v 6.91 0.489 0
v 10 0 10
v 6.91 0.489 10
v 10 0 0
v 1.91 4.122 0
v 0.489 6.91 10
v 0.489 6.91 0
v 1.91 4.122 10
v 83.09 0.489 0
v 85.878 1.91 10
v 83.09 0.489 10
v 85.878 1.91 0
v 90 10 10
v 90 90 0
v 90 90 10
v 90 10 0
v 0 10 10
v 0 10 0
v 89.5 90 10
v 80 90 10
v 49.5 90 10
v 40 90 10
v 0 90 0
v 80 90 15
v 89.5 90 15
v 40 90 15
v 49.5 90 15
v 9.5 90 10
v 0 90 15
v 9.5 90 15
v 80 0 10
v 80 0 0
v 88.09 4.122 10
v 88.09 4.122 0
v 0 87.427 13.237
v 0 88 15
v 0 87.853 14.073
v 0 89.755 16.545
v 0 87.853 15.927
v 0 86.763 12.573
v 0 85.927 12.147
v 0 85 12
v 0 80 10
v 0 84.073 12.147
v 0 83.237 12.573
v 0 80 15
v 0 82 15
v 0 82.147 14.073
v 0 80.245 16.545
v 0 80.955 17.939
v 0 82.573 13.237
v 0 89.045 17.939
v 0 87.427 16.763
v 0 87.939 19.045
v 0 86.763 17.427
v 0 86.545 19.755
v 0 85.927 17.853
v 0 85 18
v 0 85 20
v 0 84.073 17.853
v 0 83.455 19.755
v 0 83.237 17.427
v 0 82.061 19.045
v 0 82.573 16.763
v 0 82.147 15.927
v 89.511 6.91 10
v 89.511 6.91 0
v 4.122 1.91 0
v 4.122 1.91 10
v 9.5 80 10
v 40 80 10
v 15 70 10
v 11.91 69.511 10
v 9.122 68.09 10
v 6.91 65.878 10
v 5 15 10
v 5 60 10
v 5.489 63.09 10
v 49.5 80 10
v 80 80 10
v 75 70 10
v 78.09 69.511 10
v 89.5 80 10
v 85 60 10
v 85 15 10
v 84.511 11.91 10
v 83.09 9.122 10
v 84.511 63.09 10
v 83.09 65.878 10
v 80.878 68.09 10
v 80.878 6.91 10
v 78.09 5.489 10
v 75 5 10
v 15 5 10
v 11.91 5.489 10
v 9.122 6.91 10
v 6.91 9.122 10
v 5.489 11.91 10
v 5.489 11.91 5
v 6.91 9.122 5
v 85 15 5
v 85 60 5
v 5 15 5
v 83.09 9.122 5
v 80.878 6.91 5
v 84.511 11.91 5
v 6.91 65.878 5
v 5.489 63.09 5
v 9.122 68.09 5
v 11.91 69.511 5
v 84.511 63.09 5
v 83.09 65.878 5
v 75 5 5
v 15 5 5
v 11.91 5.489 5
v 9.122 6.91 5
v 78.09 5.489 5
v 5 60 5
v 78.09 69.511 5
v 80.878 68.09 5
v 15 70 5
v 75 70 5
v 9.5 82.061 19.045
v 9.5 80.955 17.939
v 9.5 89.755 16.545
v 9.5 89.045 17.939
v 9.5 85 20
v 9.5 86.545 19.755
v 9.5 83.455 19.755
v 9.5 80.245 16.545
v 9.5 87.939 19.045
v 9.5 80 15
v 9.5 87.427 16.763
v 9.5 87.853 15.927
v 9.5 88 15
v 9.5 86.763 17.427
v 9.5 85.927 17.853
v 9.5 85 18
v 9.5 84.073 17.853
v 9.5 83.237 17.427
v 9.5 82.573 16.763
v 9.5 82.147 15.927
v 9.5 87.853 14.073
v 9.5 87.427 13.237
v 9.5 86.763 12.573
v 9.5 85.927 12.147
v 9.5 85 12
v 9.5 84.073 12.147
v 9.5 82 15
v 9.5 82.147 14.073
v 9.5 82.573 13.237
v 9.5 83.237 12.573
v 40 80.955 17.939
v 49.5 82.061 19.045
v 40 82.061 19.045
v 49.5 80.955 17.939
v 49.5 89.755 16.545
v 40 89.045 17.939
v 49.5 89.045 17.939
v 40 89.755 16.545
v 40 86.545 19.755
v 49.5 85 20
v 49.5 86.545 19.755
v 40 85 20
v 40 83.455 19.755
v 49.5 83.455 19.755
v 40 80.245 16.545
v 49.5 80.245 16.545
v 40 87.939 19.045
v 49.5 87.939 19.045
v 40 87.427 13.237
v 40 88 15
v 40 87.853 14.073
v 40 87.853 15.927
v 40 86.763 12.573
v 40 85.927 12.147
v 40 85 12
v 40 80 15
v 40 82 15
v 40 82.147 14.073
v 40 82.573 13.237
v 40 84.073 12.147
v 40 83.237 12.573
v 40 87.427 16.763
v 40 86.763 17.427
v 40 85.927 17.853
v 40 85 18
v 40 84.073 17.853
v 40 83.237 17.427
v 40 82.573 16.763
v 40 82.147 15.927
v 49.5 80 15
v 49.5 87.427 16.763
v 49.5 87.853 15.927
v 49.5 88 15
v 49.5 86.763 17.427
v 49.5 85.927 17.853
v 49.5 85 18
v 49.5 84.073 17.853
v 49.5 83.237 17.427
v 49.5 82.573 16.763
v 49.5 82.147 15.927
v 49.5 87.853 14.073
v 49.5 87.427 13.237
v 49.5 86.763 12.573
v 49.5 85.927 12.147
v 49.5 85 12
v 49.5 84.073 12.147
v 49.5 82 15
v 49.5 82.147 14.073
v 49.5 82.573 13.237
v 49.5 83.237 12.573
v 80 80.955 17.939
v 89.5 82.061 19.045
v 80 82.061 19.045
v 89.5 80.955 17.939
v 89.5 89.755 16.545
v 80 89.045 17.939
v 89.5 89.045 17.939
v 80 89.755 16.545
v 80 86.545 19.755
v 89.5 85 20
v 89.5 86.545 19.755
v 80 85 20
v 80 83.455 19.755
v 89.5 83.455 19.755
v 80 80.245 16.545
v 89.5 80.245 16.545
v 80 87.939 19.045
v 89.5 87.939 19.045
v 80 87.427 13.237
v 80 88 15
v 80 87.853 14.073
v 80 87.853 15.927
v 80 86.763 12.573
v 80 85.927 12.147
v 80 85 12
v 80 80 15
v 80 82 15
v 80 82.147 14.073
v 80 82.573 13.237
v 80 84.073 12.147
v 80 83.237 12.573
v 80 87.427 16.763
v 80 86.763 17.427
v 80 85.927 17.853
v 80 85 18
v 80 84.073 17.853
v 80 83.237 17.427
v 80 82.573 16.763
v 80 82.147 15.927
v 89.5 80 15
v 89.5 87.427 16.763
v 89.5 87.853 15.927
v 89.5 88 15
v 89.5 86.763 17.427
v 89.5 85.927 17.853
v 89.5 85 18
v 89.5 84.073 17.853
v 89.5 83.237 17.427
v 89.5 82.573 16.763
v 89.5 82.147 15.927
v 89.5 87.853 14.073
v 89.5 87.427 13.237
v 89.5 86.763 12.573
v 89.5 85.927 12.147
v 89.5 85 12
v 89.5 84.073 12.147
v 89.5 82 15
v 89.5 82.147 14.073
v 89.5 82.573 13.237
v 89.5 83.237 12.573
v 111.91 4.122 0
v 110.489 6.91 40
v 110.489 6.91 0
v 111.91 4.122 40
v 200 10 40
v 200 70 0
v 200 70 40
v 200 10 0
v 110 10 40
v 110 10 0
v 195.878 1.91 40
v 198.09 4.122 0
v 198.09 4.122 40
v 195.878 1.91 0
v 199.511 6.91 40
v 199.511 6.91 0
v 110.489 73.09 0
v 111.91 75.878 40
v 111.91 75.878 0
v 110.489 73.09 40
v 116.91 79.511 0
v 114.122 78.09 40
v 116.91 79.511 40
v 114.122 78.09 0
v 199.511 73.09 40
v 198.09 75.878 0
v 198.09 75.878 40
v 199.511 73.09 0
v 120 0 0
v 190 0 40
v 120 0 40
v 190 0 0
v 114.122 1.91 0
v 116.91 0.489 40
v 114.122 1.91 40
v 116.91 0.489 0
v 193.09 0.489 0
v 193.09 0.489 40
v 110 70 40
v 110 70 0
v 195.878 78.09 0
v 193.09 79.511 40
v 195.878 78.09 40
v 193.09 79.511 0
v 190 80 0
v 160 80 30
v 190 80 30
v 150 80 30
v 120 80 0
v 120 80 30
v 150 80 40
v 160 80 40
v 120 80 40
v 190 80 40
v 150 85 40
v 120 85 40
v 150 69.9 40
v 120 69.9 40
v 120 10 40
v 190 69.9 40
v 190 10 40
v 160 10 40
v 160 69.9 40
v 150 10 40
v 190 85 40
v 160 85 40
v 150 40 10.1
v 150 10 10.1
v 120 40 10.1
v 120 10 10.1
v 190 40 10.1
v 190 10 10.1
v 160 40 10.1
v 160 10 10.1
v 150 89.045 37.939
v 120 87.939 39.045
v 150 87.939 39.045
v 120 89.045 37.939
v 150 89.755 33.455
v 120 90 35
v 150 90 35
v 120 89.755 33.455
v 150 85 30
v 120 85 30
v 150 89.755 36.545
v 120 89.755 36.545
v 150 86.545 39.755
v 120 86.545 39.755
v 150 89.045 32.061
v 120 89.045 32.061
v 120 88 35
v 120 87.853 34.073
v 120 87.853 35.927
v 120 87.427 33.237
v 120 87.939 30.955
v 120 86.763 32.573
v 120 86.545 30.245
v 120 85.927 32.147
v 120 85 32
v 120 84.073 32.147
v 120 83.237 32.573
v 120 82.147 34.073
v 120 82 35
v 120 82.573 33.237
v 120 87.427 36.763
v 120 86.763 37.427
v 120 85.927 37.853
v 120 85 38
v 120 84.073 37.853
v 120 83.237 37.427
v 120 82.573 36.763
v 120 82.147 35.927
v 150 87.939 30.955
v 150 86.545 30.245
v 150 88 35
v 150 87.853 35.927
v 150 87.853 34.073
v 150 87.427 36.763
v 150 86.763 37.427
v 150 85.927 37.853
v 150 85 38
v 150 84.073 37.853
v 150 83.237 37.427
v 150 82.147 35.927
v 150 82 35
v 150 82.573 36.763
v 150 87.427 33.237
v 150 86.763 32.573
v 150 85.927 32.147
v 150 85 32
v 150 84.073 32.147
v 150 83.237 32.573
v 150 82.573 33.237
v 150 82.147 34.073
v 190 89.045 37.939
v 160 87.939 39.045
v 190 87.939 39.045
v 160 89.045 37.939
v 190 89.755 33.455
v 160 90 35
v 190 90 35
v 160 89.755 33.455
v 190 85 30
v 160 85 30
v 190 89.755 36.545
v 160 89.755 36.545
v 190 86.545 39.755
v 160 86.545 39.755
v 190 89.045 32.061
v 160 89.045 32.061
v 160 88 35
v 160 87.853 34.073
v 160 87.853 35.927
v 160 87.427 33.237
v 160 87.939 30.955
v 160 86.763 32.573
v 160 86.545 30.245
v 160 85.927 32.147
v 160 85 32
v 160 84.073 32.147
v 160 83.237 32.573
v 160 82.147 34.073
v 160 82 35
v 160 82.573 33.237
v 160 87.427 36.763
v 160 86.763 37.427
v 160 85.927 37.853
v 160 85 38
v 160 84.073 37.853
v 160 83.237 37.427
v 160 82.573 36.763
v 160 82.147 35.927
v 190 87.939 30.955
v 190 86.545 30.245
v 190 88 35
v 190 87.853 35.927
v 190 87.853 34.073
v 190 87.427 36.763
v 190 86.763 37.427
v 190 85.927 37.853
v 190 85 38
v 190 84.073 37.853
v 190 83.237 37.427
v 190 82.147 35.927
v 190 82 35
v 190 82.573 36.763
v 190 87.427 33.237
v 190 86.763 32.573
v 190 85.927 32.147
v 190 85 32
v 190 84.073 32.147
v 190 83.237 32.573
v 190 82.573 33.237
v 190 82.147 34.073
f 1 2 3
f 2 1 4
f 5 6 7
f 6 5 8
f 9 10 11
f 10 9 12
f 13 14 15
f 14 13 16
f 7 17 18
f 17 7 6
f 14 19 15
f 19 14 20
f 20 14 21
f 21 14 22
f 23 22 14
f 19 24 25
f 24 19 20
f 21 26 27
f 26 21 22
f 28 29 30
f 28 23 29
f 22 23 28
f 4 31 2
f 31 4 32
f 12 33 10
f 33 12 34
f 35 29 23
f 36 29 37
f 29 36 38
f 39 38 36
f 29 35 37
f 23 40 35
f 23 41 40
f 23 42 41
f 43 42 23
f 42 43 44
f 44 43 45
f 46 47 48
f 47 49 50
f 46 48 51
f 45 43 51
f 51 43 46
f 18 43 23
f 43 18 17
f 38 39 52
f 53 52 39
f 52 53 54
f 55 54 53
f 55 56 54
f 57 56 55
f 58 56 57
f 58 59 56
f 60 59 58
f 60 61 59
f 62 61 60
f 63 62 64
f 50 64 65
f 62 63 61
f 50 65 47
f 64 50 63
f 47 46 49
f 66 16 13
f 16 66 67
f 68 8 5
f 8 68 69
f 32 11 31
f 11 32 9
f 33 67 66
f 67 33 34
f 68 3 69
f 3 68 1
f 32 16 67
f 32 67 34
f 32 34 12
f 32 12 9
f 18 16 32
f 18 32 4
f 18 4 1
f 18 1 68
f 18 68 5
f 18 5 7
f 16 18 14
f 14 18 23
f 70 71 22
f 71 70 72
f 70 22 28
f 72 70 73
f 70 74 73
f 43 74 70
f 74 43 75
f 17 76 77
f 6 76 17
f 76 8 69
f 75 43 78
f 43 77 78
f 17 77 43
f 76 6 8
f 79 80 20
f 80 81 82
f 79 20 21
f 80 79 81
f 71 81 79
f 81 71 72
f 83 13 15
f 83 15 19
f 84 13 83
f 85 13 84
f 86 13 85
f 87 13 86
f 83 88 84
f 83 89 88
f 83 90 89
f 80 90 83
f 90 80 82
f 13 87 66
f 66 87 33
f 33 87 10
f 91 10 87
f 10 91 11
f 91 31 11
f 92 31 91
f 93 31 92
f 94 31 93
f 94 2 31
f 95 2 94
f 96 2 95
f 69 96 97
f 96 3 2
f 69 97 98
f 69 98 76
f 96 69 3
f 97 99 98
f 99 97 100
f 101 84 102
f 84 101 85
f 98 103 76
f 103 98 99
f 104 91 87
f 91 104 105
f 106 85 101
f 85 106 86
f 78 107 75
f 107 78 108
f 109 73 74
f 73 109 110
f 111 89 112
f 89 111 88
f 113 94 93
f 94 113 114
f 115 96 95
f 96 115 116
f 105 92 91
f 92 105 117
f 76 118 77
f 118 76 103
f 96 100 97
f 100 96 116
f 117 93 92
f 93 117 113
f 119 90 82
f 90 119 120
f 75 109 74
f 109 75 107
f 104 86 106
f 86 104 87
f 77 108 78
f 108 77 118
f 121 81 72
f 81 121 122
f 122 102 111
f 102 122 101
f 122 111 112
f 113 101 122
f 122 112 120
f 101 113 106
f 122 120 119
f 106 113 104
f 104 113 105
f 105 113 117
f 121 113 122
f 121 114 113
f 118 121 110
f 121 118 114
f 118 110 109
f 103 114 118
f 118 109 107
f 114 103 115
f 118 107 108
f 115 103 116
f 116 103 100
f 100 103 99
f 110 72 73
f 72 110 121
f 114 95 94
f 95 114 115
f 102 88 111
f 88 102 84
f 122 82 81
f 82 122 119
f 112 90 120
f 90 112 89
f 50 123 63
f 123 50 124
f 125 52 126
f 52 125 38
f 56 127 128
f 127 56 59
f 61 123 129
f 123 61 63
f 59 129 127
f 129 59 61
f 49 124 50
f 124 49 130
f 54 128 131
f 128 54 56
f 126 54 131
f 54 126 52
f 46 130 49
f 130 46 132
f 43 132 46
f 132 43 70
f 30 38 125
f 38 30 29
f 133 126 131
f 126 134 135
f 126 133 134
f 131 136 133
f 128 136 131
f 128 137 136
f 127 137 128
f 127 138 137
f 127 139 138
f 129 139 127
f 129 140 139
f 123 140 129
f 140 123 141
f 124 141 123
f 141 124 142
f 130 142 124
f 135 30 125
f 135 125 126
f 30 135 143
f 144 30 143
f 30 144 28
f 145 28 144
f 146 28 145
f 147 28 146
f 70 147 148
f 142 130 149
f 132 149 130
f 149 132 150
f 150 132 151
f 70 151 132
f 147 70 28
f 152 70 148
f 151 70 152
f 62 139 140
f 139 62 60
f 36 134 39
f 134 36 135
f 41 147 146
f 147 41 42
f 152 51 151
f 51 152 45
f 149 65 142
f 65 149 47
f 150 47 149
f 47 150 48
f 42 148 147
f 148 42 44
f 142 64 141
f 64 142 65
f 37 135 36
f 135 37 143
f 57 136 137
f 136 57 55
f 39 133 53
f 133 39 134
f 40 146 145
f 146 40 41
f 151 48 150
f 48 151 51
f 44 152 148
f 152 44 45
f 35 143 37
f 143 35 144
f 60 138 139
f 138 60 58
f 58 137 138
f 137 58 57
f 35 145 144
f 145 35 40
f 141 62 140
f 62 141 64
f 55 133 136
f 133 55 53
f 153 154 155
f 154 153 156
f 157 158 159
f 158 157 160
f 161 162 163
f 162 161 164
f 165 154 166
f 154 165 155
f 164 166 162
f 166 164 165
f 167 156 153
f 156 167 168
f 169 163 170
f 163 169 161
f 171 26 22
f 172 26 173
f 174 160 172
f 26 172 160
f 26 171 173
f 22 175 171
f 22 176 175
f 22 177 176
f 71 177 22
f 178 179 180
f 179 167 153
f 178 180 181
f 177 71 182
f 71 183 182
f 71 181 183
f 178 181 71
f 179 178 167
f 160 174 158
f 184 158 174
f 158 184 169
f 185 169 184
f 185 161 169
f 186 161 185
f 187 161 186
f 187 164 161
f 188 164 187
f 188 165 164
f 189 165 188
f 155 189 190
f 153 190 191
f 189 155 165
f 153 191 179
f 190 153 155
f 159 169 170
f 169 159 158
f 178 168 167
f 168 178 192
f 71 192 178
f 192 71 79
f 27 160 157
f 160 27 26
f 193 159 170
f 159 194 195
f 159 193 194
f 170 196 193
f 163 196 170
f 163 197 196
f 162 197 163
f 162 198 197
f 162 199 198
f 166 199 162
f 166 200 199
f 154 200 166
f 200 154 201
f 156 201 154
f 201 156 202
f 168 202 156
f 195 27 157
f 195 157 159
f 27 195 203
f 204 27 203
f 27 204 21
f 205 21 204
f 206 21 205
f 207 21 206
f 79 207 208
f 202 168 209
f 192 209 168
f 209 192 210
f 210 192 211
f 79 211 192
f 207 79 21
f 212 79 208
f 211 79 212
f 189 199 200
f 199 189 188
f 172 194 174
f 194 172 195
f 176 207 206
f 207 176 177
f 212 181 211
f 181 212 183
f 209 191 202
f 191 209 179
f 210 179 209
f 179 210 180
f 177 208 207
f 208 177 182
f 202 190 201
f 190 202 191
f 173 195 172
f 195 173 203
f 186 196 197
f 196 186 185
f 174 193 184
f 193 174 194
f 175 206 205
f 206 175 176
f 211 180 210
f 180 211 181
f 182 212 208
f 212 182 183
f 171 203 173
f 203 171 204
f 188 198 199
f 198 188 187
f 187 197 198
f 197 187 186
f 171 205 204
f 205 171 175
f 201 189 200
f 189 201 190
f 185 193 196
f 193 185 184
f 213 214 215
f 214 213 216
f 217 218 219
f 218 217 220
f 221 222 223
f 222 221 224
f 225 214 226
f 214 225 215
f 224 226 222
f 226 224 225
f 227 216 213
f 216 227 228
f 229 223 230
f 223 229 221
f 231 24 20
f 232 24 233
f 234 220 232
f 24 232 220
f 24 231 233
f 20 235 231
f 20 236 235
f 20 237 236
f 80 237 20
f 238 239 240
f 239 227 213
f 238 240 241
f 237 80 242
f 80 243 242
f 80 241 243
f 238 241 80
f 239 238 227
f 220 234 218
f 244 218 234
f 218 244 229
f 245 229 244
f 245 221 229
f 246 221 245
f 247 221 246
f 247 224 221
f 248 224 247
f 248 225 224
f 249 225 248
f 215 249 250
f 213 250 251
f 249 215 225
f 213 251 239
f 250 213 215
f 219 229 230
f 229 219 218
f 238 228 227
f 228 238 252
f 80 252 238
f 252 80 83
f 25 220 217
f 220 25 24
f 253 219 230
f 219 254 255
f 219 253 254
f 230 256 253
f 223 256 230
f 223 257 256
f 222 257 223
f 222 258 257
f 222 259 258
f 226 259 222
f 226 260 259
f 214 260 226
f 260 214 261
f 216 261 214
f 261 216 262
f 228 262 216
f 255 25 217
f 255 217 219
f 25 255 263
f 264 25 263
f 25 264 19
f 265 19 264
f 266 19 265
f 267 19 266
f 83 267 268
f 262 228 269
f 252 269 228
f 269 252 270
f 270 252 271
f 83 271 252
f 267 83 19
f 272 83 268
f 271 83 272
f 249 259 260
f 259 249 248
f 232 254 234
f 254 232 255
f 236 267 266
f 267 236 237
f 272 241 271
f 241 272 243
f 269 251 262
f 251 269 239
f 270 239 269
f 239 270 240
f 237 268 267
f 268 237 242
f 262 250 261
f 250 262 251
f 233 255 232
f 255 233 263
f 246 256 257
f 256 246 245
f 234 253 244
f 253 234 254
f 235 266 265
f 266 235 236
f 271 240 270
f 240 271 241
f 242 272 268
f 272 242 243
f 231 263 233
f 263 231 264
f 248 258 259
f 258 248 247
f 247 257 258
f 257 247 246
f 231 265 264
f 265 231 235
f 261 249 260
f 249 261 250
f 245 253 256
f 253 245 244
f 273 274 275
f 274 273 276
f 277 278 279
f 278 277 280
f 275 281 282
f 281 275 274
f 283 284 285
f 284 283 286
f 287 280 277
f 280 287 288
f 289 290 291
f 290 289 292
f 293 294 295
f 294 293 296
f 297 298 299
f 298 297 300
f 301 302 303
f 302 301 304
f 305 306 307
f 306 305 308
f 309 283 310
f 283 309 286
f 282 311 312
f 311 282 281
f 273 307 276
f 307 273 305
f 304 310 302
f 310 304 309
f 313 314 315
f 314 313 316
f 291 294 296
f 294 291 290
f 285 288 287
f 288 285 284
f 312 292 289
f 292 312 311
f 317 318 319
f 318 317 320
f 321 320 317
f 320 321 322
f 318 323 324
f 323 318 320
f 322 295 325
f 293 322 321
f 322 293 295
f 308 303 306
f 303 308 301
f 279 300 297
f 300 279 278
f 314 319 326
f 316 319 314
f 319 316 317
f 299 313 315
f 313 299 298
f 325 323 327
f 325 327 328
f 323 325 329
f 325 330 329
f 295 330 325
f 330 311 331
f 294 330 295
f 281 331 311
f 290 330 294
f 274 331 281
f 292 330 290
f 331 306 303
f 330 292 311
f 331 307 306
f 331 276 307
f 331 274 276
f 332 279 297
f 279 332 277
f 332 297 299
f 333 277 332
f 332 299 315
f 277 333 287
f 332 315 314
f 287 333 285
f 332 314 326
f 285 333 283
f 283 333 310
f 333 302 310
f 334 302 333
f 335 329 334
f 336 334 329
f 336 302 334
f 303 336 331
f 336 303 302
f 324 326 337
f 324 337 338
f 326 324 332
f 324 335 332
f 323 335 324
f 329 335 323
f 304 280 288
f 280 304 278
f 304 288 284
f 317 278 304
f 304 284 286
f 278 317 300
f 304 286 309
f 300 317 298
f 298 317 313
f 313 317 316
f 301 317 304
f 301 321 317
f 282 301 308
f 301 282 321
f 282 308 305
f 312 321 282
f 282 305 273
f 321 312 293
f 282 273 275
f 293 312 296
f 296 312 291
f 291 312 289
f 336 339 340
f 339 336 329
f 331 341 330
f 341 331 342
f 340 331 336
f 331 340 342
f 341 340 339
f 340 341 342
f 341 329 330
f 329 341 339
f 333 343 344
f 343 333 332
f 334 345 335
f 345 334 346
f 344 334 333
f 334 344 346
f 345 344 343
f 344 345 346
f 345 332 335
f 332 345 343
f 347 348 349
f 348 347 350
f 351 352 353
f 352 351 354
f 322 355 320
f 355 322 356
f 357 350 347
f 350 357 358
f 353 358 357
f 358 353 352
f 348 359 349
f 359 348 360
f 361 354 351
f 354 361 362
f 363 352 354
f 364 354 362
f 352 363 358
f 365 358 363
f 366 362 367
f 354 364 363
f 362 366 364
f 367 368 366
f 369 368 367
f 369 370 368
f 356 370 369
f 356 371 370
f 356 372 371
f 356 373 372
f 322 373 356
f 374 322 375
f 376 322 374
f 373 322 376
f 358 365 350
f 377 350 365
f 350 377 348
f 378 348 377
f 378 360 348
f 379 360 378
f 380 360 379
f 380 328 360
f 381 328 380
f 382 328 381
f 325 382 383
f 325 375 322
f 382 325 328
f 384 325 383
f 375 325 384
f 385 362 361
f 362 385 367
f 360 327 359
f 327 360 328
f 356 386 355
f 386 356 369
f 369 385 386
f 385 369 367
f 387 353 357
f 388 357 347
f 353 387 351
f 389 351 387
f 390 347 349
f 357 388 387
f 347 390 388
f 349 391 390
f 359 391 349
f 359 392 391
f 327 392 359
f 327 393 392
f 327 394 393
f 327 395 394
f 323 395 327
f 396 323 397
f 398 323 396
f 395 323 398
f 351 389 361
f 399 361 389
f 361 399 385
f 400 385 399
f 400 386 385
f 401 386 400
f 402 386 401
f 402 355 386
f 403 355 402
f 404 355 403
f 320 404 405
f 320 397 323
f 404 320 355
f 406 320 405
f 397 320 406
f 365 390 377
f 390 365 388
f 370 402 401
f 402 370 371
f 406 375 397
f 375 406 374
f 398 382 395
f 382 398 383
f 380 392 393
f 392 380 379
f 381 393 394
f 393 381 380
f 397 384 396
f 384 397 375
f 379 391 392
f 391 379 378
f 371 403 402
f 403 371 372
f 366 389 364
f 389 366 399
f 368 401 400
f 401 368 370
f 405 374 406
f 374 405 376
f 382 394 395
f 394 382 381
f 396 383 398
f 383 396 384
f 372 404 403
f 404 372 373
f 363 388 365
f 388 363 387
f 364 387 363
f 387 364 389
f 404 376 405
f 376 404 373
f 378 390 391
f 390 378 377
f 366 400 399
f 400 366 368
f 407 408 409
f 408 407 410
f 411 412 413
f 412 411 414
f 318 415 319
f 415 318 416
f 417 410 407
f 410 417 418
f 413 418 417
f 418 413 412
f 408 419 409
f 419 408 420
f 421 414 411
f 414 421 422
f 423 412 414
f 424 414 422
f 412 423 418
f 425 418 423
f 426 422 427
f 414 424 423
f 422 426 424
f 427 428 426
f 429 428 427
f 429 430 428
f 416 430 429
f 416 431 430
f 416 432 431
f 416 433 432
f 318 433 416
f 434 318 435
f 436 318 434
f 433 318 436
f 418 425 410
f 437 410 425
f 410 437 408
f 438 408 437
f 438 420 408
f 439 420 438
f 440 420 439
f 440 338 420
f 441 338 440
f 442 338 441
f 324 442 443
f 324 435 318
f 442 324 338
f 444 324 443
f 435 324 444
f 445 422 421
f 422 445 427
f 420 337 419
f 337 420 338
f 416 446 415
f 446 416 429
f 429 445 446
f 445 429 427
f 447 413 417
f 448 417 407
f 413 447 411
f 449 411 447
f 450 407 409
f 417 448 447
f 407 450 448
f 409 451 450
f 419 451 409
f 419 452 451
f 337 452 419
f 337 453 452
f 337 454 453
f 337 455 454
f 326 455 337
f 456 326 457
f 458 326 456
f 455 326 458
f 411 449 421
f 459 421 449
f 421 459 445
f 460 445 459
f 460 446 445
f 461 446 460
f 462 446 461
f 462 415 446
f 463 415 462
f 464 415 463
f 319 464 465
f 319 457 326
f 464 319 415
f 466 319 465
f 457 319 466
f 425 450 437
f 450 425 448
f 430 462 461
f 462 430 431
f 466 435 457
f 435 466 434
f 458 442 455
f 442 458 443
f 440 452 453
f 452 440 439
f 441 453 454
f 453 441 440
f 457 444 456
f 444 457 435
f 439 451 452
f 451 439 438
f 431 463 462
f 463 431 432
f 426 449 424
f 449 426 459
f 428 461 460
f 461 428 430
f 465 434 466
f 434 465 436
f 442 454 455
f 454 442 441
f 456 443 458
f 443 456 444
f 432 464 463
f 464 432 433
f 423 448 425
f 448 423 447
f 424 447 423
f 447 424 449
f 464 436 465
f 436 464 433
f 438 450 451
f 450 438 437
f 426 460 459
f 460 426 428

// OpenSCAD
module prism(l, w, h){
    polyhedron(
        points=[
            [0,0,0], 
            [l,0,0], 
            [l,w,0], 
            [0,w,0], 
            [0,w,h], 
            [l,w,h]
        ],
        faces=[
            [0,1,2,3],
            [5,4,3,2],
            [0,4,5,1],
            [0,3,4],
            [5,2,1]
        ]
   );
}

module tub_bottom_cutout() {
    translate([3,3,0])
    rotate([0,0,180])
    hull() {
        cube([3,3,3]);
            
        rotate([90,0,0]) 
            prism(3,3,3)
            translate([1.5,0,0]);
    }
}

module tub_bottom() {
    linear_extrude(height=4){
        hull() {
            translate([1,1]) circle(r=1,$fn=20);
            translate([1,7]) circle(r=1,$fn=20);
            translate([8,7]) circle(r=1,$fn=20);
            translate([8,1]) circle(r=1,$fn=20);
        }
    }
}

module tub_peg(size=3) {
    difference() {
        translate([0,0,2])
        rotate([0,90,0])
        linear_extrude(height=size) {
            translate([1.5,0.5,0]) circle(r=0.5,$fn=20);
            translate([1.5,0,1]) square(size=[0.5,1]);
        }    
        
        translate([-1,0.5,0.5])
        rotate([0,90,0])
        cylinder(r=0.3,h=5, $fn=20);
    }
}


module tub_top() {
    union(){
        difference() {
            linear_extrude(height=1){
                hull() {
                    translate([1,1]) circle(r=1,$fn=20);
                    translate([0,8]) square(1);
                    translate([8,8]) square(1);
                    translate([8,1]) circle(r=1,$fn=20);
                }
            }
            
            translate([0,0,0.5])
            linear_extrude(height=1){
                hull() {
                    translate([1.5,1.5]) circle(r=1,$fn=20);
                    translate([1.5,6]) circle(r=1,$fn=20);
                    translate([7.5,6]) circle(r=1,$fn=20);
                    translate([7.5,1.5]) circle(r=1,$fn=20);
                }
            }
        }

        translate([0,8,1]) 
            tub_peg(0.95);
        
        translate([4,8,1]) 
            tub_peg(0.95);
        
        
        translate([8,8,1]) 
            tub_peg(0.95);
    }
}


module tub(){    
    union(){
        difference(){
            tub_bottom();
            translate([1,1,1.01]) 
                tub_bottom_cutout();
            translate([5,1,1.01]) 
                tub_bottom_cutout();

        }
        
        translate([1,8,4]) rotate([-90,0,0]) tub_peg();
        translate([5,8,4]) rotate([-90,0,0]) tub_peg();
    }
}


/////////////////////////////

scale([10,10,10]) tub_top();
translate([110,0,0]) scale([10,10,10]) tub();
